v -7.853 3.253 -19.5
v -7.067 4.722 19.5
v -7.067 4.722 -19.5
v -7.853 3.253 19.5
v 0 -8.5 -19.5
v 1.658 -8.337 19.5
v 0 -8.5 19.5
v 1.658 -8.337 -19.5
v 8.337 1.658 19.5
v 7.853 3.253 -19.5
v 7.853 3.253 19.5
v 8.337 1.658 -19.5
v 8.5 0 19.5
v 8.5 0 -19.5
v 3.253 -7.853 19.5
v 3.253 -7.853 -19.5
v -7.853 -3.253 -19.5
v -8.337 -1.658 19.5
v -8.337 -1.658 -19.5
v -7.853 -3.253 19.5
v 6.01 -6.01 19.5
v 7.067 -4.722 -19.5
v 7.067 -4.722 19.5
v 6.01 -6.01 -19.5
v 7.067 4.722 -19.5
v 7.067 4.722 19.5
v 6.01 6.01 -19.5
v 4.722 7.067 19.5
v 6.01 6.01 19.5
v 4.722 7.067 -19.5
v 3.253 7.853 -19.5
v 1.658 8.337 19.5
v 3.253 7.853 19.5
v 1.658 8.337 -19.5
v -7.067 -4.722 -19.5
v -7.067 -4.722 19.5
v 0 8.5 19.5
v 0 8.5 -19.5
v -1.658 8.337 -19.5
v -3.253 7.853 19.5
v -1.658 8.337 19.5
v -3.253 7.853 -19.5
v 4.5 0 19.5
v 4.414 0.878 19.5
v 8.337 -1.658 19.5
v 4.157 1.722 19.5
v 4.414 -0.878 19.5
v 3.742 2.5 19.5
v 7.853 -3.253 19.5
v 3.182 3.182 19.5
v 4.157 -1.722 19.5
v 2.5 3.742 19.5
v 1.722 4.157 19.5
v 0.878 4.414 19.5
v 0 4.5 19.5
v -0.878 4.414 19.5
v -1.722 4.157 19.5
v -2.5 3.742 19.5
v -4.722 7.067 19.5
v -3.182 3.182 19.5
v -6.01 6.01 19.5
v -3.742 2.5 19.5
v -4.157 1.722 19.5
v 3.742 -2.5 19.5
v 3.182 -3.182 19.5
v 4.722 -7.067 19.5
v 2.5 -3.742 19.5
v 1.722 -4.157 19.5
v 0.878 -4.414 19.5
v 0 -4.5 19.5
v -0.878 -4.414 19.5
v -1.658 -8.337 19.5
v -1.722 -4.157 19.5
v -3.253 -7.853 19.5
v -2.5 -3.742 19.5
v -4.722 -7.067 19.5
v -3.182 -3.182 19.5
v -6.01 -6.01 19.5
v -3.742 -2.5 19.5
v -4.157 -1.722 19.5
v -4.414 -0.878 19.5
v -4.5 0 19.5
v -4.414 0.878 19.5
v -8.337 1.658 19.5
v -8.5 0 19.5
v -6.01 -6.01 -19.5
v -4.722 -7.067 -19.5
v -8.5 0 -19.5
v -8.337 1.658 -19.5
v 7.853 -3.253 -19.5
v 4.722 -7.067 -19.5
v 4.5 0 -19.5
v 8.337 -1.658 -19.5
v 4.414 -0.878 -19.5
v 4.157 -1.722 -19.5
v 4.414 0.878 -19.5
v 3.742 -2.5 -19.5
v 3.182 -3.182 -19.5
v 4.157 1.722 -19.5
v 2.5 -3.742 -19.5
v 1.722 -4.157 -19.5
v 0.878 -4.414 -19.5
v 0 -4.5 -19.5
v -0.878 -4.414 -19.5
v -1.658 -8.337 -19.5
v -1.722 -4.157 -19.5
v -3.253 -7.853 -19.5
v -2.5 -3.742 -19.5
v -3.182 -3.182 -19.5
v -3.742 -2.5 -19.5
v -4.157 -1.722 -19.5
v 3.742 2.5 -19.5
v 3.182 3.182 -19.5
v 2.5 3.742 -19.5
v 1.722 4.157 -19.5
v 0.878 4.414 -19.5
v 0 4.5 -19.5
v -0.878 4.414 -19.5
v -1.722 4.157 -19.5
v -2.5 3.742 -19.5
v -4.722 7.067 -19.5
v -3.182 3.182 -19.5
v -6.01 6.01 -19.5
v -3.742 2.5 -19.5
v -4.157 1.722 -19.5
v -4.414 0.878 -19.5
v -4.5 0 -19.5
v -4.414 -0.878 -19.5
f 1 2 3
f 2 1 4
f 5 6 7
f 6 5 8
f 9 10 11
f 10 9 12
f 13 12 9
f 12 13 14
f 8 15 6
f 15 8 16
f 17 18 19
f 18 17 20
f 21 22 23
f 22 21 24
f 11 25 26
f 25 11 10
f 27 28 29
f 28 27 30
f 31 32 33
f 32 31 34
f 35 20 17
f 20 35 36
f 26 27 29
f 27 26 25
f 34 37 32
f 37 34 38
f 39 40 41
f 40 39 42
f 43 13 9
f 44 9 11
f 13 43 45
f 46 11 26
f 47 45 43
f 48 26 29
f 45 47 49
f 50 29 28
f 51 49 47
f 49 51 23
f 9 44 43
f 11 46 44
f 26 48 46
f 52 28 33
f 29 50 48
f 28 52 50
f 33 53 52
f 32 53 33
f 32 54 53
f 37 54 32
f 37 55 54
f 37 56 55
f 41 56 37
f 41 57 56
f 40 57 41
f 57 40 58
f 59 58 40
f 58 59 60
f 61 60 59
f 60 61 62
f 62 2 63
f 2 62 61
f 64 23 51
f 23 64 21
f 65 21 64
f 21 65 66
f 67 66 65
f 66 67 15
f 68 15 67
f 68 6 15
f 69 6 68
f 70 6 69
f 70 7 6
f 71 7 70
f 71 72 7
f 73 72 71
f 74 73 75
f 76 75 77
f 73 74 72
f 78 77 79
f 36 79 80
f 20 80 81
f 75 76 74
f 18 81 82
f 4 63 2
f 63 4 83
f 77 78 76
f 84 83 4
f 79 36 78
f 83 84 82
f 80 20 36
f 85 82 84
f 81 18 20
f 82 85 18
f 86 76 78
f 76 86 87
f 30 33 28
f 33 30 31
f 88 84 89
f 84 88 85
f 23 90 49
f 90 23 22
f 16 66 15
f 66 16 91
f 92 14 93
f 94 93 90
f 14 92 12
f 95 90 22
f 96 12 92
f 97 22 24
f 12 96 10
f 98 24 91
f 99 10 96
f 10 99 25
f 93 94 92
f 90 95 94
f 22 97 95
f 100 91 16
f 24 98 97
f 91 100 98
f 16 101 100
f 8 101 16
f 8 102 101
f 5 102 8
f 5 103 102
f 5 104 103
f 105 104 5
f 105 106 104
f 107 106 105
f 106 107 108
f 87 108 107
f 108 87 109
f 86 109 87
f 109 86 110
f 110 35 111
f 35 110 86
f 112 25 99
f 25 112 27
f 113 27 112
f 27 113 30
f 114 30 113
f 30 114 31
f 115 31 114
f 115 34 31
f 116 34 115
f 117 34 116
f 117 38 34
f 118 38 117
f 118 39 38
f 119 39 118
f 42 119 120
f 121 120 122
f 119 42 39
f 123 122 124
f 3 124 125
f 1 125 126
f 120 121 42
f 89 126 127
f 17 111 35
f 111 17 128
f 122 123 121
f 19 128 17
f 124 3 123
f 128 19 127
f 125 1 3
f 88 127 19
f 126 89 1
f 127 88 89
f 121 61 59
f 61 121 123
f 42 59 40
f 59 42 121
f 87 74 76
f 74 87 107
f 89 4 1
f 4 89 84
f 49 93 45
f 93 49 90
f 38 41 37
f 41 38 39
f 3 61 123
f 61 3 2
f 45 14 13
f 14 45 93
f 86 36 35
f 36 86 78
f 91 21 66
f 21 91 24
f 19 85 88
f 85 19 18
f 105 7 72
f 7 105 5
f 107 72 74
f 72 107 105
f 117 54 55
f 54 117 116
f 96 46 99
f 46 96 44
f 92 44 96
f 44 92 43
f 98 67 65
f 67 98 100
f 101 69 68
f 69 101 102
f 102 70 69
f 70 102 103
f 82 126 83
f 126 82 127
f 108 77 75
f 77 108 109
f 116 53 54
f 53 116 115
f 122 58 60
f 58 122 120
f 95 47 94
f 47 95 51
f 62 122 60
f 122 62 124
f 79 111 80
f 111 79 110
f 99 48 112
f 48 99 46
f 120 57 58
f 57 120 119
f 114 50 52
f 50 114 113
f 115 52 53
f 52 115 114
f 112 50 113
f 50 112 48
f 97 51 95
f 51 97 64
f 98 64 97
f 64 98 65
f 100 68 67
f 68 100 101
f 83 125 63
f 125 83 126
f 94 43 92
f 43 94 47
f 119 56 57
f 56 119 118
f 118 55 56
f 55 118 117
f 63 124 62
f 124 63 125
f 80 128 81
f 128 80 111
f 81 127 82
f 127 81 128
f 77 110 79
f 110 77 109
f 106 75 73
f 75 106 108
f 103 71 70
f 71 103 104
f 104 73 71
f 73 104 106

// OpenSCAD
od = 17;

//notch_thick = 2;
//notch_width = 4.5;

id = 9;
h  = 39;
// cylindrical spacer to choose
// correct angle of the bearings
module spacer()
{
   difference()
   {
     cylinder(d=od, h=h, $fn=32, center=true);
     cylinder(d=id, h=h+1, $fn=32, center=true);
   }
}

spacer();
